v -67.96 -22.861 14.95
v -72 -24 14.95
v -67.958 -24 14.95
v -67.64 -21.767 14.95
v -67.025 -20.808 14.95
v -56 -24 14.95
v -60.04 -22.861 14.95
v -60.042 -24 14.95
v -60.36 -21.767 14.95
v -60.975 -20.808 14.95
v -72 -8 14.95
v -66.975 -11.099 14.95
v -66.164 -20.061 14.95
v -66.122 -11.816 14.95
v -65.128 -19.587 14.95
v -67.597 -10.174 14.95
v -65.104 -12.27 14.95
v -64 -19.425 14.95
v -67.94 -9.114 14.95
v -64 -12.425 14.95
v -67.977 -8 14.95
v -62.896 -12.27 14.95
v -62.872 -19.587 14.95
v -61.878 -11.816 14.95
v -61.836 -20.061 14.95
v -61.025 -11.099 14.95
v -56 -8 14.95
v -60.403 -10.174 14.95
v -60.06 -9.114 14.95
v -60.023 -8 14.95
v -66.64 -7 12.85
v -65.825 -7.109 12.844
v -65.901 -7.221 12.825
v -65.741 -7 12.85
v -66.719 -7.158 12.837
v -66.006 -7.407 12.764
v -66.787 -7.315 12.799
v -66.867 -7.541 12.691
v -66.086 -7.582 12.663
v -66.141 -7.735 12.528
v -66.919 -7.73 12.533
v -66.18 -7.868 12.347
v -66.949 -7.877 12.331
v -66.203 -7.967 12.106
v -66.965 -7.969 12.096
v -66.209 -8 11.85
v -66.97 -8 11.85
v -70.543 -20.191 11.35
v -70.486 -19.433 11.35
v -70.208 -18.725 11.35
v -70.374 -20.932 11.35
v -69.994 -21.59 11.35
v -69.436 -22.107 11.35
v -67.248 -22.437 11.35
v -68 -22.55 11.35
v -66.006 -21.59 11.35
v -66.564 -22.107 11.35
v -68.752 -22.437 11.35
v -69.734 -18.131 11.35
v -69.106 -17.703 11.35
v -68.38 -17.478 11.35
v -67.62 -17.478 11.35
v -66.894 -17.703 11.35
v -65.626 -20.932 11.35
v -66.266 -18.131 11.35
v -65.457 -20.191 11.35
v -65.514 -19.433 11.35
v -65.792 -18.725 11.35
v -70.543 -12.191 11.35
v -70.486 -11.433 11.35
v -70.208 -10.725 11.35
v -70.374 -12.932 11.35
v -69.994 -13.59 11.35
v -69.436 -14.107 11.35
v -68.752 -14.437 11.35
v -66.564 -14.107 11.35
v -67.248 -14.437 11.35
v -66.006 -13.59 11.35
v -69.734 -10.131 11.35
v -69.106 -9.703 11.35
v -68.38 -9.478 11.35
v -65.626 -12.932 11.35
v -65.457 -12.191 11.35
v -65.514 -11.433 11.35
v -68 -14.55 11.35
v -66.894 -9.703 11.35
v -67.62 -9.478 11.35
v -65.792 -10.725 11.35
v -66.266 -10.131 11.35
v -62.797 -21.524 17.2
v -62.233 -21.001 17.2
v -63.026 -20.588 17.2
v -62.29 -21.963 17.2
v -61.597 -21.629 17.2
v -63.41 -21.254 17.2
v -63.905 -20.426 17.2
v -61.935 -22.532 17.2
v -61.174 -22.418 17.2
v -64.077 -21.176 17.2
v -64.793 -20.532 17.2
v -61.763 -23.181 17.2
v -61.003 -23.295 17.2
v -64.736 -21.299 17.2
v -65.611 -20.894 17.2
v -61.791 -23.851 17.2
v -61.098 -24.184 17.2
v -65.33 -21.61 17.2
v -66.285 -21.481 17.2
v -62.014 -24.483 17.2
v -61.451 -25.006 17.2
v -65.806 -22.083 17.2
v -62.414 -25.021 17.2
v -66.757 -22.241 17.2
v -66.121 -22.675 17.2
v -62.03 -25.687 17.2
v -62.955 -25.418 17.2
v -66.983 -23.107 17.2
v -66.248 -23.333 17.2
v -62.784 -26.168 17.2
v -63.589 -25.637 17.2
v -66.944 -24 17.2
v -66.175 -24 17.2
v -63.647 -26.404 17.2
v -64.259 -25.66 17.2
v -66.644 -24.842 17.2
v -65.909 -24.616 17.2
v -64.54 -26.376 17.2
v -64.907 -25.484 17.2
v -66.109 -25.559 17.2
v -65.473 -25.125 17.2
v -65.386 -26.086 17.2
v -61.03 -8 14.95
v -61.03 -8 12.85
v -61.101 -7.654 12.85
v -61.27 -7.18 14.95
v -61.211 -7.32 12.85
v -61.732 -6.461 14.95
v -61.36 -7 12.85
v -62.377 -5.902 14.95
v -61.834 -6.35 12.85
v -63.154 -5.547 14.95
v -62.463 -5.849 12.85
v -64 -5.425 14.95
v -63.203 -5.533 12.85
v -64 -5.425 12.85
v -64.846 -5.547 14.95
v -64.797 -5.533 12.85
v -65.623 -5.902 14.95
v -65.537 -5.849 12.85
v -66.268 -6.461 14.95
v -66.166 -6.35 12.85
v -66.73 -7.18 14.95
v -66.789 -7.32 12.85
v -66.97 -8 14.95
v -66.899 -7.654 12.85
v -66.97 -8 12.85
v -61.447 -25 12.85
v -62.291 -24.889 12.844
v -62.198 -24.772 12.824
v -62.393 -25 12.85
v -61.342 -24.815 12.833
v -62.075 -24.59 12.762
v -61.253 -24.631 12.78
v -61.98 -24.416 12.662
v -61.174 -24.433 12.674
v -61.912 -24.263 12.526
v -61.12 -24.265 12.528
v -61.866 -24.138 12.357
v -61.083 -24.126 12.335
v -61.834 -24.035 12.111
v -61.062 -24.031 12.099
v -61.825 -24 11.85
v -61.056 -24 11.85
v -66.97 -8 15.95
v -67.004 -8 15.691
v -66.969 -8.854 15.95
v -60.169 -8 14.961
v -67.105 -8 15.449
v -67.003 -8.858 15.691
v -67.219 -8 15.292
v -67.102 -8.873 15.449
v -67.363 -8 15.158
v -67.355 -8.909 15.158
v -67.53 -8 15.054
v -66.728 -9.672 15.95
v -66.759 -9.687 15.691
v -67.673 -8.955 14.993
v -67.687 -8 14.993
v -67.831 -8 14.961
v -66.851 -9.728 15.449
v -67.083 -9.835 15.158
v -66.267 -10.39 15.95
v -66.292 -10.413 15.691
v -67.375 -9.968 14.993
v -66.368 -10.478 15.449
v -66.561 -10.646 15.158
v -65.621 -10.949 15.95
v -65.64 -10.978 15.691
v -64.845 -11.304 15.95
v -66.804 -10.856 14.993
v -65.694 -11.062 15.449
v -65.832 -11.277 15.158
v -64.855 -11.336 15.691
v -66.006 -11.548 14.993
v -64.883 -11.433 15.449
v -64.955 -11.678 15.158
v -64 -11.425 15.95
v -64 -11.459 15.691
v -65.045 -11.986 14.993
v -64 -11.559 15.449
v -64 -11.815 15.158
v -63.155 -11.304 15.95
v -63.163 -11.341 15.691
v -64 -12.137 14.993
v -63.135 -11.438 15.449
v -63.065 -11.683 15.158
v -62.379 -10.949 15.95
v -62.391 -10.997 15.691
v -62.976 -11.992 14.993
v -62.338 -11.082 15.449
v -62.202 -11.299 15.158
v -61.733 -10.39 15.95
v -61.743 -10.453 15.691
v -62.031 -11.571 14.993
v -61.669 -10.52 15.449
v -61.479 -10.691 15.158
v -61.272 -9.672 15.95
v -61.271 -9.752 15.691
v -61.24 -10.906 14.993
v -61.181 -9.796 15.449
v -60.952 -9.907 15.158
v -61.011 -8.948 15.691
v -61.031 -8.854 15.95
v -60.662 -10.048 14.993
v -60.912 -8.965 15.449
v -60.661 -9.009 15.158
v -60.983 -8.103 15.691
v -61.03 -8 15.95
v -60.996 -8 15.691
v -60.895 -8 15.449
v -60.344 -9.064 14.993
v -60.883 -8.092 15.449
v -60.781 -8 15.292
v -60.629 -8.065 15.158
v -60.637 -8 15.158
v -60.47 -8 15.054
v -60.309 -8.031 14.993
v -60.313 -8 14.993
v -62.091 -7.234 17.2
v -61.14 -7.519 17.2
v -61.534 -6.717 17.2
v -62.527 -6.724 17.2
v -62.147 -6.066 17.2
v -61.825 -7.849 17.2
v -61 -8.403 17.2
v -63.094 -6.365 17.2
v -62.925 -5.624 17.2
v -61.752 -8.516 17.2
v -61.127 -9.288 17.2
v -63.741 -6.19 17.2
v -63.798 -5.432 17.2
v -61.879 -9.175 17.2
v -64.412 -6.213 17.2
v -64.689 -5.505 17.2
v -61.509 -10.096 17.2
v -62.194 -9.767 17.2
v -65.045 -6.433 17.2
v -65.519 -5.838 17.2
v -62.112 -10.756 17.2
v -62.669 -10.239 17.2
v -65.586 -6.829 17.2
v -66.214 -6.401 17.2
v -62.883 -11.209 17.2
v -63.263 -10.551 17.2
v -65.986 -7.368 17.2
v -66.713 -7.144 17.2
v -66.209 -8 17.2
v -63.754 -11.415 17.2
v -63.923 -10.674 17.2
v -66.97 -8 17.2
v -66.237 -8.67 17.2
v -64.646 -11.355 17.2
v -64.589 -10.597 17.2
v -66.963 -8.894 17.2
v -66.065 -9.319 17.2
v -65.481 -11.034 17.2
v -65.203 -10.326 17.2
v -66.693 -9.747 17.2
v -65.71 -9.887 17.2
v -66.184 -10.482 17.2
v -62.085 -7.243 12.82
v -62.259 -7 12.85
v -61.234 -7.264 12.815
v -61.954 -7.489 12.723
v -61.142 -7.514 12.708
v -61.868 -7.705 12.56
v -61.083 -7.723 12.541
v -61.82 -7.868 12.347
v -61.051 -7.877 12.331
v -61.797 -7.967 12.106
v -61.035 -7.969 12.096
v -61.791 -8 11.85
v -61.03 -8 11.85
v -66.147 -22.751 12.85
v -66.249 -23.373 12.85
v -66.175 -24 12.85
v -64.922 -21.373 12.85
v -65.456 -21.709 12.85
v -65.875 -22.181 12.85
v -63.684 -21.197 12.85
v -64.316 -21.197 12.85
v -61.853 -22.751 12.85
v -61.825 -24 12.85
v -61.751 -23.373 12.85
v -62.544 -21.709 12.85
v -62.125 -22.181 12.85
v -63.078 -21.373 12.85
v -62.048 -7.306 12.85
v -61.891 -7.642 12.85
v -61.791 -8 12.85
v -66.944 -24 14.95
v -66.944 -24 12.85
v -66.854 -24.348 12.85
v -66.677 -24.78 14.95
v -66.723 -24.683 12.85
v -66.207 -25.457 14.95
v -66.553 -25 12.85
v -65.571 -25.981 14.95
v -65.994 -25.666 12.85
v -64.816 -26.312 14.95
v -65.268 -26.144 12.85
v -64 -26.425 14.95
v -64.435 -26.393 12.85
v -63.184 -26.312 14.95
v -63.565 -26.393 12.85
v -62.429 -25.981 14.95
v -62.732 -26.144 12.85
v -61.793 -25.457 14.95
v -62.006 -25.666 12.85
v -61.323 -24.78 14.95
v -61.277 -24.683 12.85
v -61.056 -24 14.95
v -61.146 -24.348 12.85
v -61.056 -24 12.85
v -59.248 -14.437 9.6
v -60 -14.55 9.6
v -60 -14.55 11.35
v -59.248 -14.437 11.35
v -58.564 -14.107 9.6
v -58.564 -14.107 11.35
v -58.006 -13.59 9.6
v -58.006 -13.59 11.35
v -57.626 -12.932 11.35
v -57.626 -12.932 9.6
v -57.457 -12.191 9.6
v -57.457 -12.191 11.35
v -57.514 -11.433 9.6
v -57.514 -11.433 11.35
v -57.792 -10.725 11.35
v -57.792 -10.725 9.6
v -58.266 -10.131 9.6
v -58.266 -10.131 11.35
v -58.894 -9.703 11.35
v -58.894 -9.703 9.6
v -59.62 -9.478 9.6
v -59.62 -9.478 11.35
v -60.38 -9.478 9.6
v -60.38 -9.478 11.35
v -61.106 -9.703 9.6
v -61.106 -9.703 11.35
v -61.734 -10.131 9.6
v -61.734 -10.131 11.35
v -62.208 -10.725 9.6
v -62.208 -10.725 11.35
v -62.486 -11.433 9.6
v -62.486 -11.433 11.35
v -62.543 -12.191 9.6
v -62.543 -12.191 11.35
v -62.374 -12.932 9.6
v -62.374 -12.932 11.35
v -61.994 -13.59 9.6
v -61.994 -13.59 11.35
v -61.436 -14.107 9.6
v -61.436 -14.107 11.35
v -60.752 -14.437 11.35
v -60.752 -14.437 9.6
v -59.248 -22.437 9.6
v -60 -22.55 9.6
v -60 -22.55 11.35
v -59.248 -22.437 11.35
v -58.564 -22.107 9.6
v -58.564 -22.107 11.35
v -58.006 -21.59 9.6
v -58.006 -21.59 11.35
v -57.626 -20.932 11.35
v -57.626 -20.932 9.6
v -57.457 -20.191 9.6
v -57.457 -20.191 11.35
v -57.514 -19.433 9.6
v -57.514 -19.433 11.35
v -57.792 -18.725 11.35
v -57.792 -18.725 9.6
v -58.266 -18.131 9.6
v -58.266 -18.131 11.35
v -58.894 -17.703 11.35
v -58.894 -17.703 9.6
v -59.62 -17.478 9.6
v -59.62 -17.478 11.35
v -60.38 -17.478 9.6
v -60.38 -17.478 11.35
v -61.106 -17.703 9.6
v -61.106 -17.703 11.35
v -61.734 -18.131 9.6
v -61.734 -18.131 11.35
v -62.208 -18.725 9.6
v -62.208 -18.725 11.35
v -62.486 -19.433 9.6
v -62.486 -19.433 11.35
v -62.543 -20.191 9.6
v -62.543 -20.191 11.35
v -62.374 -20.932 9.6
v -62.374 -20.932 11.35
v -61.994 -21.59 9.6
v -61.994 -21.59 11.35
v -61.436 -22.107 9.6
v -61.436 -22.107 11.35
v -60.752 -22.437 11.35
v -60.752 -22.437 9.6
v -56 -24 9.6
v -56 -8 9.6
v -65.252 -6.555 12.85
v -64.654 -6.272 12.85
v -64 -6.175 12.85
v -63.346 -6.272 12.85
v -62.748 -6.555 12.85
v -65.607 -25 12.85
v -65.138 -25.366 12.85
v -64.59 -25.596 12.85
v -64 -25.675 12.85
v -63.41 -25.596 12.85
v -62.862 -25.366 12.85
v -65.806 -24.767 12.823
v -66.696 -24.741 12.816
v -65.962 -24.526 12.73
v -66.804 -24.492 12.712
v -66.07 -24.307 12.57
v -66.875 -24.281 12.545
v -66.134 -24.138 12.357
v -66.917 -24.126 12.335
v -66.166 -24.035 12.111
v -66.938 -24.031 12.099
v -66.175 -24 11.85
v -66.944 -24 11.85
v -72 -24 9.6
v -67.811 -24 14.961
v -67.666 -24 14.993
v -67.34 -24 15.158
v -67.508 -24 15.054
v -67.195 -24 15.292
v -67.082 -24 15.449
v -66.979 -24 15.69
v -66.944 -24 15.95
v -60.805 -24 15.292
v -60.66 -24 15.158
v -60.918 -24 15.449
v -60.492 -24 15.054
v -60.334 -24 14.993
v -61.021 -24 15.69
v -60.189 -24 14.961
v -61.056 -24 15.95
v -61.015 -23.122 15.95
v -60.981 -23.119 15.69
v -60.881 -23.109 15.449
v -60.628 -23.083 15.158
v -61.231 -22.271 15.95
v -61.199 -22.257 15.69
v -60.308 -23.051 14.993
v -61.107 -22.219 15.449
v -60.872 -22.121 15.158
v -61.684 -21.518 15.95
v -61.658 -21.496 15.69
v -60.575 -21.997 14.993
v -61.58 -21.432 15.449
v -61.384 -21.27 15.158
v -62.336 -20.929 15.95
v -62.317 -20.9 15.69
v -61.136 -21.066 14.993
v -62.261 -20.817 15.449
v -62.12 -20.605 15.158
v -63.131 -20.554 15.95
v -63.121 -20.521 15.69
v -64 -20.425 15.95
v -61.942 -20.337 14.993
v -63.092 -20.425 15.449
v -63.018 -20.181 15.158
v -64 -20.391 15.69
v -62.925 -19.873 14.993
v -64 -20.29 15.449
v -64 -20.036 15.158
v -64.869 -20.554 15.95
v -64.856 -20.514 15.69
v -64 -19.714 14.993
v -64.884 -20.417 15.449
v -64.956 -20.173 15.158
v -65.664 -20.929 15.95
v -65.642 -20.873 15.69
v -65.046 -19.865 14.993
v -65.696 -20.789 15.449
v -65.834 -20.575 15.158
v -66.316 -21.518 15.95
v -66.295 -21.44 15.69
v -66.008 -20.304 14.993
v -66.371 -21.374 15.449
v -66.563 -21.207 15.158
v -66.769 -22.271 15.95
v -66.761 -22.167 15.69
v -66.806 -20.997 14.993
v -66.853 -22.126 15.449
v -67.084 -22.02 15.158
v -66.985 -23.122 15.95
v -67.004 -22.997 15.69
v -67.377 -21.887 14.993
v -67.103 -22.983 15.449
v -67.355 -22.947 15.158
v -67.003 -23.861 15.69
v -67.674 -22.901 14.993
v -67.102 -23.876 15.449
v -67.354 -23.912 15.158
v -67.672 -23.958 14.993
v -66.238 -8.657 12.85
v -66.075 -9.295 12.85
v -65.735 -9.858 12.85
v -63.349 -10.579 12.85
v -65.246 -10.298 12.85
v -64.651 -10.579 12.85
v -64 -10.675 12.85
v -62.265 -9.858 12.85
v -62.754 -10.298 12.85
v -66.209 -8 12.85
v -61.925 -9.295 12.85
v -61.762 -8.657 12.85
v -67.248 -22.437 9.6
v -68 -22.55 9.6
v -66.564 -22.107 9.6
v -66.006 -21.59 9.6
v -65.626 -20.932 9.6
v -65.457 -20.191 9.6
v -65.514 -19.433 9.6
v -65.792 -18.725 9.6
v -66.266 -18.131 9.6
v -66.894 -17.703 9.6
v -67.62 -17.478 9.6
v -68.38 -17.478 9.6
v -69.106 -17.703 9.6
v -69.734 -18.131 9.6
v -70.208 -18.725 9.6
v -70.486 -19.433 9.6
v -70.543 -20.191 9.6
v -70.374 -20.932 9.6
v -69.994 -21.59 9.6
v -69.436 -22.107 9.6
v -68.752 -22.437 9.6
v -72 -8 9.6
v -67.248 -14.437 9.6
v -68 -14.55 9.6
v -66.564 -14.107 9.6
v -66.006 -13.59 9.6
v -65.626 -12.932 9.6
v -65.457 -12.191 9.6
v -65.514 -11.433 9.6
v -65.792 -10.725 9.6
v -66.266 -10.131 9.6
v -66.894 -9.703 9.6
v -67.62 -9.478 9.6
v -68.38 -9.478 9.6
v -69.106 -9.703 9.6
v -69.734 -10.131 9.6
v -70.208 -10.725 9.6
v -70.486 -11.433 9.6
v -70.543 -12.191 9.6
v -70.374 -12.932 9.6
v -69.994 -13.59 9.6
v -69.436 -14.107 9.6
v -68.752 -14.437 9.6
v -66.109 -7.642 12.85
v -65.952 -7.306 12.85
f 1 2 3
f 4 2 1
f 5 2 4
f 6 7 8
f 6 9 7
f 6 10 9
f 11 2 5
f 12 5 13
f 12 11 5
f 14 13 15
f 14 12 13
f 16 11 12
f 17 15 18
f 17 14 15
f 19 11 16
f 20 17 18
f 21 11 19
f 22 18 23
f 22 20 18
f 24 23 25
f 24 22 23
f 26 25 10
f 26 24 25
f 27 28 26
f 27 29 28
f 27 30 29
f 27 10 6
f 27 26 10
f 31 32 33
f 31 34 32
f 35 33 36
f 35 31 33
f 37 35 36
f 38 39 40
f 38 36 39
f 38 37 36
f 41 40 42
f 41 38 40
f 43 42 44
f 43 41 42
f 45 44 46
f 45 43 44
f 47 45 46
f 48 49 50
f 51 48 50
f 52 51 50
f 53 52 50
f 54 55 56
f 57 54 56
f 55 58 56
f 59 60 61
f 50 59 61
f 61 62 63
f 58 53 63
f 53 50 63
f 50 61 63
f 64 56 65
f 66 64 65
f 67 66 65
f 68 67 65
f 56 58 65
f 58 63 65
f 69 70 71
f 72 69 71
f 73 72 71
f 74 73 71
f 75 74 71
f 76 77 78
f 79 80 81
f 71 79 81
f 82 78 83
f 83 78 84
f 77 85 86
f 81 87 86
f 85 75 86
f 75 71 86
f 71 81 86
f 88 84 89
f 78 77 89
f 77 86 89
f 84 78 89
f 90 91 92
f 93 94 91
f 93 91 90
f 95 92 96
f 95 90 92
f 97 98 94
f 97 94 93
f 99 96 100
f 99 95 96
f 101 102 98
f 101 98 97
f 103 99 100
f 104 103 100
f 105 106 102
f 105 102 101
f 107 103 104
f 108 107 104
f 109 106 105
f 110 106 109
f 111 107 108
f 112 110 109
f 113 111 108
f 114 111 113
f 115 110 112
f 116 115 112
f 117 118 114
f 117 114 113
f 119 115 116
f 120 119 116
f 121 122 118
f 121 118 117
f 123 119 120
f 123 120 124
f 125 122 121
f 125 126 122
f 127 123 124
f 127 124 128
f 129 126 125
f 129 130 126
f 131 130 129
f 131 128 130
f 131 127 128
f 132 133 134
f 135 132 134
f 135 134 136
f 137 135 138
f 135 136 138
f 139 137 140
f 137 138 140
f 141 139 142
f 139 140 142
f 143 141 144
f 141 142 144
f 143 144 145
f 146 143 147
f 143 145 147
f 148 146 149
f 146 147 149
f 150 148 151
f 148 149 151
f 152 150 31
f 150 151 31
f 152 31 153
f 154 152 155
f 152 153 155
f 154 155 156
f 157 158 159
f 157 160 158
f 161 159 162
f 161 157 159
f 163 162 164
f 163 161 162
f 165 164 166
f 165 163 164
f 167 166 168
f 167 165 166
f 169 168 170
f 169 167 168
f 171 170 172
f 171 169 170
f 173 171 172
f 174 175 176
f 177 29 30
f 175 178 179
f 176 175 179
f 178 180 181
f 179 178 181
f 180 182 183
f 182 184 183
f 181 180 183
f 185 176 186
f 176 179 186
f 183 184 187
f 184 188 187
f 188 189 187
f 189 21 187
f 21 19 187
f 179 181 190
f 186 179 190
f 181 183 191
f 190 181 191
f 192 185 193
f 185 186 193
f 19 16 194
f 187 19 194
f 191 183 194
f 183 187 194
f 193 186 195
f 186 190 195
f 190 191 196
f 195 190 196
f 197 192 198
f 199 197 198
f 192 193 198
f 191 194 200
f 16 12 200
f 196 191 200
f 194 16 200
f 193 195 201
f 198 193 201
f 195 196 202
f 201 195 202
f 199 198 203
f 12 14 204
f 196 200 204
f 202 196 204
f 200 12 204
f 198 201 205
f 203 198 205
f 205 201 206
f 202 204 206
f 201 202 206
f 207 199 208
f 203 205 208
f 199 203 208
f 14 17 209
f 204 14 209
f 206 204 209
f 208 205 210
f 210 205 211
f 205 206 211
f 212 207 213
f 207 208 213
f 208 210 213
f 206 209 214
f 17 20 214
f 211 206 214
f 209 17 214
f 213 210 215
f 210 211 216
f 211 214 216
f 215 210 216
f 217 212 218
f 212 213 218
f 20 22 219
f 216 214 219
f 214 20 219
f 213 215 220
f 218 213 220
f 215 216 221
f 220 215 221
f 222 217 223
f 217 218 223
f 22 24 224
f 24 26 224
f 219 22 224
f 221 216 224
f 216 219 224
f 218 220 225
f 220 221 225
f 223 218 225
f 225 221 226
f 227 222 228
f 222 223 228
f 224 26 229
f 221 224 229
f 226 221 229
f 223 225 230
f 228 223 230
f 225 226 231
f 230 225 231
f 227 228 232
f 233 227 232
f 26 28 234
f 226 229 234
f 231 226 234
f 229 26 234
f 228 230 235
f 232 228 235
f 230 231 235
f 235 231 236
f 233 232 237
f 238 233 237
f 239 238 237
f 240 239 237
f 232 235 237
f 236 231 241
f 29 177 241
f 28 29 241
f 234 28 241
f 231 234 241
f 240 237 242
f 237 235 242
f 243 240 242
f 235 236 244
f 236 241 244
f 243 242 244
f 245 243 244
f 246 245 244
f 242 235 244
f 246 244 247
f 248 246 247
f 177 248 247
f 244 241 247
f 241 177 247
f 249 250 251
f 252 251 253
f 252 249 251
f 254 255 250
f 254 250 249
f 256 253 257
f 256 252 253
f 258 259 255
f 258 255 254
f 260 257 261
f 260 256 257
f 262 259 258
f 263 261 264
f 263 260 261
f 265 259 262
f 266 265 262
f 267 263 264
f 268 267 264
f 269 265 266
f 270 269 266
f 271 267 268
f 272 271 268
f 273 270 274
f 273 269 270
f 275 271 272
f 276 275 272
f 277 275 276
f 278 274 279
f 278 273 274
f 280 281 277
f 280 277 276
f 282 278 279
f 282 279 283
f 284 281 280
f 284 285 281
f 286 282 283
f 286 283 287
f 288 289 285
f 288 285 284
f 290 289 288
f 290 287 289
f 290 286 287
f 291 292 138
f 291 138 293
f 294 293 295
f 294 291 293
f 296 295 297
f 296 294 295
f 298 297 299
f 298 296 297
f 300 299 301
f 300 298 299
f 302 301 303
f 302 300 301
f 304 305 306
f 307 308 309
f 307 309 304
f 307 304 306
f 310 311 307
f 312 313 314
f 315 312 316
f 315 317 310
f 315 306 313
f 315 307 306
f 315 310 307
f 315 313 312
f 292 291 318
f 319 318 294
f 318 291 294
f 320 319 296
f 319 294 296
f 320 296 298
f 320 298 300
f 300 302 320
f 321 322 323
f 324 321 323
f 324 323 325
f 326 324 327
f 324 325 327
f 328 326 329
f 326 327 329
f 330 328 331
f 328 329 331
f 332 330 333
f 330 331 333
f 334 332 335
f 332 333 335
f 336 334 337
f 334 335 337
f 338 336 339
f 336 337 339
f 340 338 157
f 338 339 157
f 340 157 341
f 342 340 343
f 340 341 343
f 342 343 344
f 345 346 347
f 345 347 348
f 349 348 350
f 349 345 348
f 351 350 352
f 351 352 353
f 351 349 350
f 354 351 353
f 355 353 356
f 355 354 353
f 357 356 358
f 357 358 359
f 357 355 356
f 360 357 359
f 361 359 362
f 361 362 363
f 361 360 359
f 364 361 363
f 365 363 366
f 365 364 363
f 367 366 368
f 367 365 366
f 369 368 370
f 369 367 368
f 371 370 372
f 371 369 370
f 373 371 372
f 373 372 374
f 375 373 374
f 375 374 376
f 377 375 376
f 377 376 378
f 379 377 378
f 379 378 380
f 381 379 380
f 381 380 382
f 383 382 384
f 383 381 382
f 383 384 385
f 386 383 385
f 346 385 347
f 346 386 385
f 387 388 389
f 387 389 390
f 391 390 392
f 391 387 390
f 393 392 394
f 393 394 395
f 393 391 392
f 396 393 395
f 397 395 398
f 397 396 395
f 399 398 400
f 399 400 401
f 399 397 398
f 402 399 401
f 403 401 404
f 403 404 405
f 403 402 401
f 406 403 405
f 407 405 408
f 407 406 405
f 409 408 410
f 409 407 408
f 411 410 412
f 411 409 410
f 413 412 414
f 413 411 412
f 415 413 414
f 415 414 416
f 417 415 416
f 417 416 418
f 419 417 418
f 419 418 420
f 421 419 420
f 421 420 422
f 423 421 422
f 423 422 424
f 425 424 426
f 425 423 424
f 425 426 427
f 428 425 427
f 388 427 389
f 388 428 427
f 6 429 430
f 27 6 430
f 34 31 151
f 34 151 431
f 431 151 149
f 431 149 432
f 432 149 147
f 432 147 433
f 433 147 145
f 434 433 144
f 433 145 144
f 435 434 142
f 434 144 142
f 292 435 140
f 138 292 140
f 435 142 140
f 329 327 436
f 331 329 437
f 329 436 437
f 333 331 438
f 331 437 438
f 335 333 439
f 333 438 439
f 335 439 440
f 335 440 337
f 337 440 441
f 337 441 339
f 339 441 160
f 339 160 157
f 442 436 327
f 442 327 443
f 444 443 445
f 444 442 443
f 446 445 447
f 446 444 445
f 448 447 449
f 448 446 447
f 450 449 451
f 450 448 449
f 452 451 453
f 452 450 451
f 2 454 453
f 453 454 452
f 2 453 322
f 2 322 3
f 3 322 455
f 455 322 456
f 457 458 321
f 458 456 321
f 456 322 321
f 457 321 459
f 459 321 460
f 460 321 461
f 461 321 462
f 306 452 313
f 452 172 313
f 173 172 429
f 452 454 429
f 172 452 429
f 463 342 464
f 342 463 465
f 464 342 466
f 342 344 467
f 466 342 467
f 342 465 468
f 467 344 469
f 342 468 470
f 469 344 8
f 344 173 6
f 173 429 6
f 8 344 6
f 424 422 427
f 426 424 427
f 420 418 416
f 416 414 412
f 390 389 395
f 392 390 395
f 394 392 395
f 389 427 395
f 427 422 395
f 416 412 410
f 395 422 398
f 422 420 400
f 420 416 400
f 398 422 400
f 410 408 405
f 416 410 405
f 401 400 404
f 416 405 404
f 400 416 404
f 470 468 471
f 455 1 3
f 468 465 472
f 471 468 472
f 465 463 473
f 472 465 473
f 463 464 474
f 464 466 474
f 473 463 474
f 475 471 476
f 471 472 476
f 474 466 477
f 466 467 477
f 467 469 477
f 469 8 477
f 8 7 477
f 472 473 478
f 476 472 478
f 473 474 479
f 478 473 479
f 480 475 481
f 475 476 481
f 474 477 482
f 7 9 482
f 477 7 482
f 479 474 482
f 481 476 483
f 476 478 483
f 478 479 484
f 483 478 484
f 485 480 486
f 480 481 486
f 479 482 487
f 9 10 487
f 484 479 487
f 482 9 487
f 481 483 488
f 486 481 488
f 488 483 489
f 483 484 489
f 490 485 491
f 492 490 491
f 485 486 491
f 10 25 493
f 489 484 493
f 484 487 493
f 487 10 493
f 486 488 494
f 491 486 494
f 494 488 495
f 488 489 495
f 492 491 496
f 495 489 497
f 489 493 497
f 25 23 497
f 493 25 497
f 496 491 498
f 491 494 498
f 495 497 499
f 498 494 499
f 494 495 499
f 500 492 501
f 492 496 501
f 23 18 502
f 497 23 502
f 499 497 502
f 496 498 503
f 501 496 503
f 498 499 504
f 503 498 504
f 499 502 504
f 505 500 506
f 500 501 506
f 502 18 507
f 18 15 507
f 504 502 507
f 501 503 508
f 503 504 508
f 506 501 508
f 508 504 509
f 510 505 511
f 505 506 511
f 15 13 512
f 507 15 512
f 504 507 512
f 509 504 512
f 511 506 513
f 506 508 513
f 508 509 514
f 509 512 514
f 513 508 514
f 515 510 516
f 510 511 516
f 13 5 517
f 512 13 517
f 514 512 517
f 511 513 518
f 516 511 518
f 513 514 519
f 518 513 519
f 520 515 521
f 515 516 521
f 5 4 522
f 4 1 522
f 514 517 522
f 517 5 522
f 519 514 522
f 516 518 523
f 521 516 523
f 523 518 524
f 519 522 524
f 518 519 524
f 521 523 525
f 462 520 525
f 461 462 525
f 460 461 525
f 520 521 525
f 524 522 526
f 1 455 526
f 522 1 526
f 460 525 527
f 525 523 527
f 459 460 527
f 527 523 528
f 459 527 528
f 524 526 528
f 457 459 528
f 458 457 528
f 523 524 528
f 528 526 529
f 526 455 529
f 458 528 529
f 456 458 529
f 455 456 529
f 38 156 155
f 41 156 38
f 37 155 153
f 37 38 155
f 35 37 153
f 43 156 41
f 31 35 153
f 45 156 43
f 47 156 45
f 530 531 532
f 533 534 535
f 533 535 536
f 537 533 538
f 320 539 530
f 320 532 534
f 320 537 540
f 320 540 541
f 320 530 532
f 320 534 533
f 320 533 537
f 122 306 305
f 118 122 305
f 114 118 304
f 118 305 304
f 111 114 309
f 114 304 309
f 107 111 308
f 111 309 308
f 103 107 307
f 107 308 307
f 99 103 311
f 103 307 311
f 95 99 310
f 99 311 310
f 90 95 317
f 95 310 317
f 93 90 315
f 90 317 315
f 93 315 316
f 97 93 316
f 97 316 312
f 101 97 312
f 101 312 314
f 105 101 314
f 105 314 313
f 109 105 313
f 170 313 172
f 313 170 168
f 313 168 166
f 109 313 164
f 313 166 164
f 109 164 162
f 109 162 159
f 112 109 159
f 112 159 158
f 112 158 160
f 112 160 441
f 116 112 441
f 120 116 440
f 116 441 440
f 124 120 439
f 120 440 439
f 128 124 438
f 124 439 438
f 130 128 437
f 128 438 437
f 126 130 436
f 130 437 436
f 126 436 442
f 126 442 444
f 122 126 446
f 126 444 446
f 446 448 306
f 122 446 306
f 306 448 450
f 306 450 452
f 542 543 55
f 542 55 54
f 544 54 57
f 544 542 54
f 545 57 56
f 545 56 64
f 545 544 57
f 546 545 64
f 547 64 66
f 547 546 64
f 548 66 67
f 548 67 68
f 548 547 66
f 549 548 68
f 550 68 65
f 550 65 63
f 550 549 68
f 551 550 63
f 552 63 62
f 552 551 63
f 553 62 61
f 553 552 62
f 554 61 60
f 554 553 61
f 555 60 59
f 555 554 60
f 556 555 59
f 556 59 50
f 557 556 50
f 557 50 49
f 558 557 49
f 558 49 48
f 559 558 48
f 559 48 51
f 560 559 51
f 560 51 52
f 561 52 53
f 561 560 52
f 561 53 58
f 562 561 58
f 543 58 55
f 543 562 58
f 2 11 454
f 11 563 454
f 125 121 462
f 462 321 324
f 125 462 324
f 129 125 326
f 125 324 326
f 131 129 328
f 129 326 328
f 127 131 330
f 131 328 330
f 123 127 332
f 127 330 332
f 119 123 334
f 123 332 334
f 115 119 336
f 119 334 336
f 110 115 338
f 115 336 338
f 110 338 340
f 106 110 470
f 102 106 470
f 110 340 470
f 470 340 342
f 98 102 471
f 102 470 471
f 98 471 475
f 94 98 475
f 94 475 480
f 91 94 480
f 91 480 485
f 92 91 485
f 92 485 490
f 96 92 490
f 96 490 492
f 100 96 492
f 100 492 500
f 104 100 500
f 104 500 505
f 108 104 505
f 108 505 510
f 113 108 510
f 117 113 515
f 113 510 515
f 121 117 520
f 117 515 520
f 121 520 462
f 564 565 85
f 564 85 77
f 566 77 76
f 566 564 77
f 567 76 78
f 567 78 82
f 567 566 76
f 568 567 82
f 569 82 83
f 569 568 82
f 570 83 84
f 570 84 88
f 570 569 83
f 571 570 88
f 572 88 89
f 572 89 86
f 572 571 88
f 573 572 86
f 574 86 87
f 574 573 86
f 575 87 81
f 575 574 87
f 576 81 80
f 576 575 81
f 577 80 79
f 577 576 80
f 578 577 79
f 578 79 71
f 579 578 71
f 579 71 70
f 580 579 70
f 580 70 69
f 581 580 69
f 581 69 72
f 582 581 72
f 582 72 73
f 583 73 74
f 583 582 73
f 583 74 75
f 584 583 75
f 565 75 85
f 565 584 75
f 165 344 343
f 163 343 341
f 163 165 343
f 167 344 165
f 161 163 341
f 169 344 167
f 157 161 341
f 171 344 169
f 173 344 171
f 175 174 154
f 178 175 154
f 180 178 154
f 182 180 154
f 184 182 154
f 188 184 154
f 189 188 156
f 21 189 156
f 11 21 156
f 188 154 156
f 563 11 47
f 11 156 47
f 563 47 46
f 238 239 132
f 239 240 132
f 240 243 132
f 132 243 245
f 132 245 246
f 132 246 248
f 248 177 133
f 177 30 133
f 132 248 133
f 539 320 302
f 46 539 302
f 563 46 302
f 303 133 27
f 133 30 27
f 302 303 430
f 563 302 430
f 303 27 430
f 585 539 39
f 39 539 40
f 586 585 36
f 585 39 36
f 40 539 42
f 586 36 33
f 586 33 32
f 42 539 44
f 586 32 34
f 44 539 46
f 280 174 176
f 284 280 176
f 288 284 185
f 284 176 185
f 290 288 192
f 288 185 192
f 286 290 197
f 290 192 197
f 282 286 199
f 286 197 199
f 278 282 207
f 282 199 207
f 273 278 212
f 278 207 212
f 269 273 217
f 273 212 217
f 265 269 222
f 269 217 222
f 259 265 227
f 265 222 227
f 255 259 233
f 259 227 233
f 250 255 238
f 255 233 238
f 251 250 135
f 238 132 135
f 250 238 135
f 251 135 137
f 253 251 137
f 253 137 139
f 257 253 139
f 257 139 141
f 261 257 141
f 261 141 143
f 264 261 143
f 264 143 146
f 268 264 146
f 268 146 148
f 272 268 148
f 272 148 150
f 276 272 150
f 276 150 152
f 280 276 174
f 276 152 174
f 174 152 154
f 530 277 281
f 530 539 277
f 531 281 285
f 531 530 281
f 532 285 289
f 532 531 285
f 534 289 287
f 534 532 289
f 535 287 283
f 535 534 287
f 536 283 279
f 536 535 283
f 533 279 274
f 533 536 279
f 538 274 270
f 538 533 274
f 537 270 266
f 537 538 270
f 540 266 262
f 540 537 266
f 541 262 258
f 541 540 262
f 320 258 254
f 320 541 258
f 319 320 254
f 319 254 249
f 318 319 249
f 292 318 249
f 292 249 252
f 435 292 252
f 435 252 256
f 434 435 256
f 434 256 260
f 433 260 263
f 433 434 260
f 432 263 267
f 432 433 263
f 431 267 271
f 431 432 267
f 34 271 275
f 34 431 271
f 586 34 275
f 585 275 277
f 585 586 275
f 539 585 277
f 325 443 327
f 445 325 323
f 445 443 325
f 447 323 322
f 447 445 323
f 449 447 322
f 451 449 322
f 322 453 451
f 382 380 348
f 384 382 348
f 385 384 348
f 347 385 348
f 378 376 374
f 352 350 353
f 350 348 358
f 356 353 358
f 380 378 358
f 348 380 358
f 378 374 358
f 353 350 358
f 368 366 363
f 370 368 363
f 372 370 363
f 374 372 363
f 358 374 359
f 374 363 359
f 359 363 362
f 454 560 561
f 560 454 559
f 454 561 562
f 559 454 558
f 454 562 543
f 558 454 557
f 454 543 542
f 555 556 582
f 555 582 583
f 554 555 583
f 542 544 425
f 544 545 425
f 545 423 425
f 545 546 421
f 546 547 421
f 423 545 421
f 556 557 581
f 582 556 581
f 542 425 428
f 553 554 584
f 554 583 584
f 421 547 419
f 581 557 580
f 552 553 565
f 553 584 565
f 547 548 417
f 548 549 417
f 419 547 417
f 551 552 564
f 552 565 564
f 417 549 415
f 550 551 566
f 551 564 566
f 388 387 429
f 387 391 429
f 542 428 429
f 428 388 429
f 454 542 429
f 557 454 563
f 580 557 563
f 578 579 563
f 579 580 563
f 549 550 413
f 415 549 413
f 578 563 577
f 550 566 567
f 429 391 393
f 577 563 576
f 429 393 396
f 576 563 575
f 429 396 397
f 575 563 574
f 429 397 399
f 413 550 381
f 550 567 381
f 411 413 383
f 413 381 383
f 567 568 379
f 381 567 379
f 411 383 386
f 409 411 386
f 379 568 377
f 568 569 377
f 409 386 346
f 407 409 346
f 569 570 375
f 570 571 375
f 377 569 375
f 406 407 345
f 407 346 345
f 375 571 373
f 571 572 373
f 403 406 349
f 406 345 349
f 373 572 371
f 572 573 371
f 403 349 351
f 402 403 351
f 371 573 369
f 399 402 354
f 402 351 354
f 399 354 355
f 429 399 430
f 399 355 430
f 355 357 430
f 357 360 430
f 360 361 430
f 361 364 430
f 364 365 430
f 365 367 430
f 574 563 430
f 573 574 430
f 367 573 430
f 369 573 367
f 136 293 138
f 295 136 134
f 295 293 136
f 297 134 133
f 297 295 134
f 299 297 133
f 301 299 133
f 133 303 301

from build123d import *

# Parameters (mm, degrees)
SKETCH5_W           = 16
SKETCH5_H           = 16
SKETCH5_R           = 2.55
BOSS_EXTRUDE1_DEPTH = 1.75
BOSS_EXTRUDE2_START = 1.75
SKETCH5_4_W         = 16
SKETCH5_4_H         = 16
BOSS_EXTRUDE2_DEPTH = 1.5
BOSS_EXTRUDE3_START = 3.25
SKETCH5_5_R         = 2.25
BOSS_EXTRUDE3_DEPTH = 2.1
BOSS_EXTRUDE4_START = 5.35
SKETCH5_6_R         = 3
SKETCH5_6_R_2       = 2.25
BOSS_EXTRUDE4_DEPTH = 2.25
FILLET1_R           = 1


with BuildPart() as part:
    # Sketch5 → Boss-Extrude1 (new body)
    with BuildSketch(Plane.XY.offset(9.6)):
        with Locations((-64, -16)):
            Rectangle(SKETCH5_W, SKETCH5_H)
        with Locations(Location((-68, -20, 0), (0, 0, 270))):
            Circle(SKETCH5_R, mode=Mode.SUBTRACT)
        with Locations(Location((-60, -20, 0), (0, 0, 270))):
            Circle(SKETCH5_R, mode=Mode.SUBTRACT)
        with Locations(Location((-68, -12, 0), (0, 0, 270))):
            Circle(SKETCH5_R, mode=Mode.SUBTRACT)
        with Locations(Location((-60, -12, 0), (0, 0, 270))):
            Circle(SKETCH5_R, mode=Mode.SUBTRACT)
    extrude(amount=BOSS_EXTRUDE1_DEPTH)

    # Sketch5<4> → Boss-Extrude2 (add)
    with BuildSketch(Plane.XY.offset(9.6).offset(BOSS_EXTRUDE2_START)):
        with Locations((-64, -16)):
            Rectangle(SKETCH5_4_W, SKETCH5_4_H)
    extrude(amount=BOSS_EXTRUDE2_DEPTH)

    # Sketch5<5> → Boss-Extrude3 (add)
    with BuildSketch(Plane.XY.offset(9.6).offset(BOSS_EXTRUDE3_START)):
        with BuildLine():
            Line((-66.969743255, -8), (-72, -8))
            Line((-72, -8), (-72, -24))
            Line((-72, -24), (-66.94438024, -24))
            ThreePointArc((-66.94438024, -24), (-64, -26.425), (-61.05561976, -24))
            Line((-61.05561976, -24), (-56, -24))
            Line((-56, -24), (-56, -8))
            Line((-56, -8), (-61.030256745, -8))
            ThreePointArc((-61.030256745, -8), (-64, -5.425), (-66.969743255, -8))
        make_face()
        with Locations(Location((-64, -23.425, 0), (0, 0, 194.806506912))):
            Circle(SKETCH5_5_R, mode=Mode.SUBTRACT)
        with Locations(Location((-64, -8.425, 0), (0, 0, 169.11205187))):
            Circle(SKETCH5_5_R, mode=Mode.SUBTRACT)
    extrude(amount=BOSS_EXTRUDE3_DEPTH)

    # Sketch5<6> → Boss-Extrude4 (add)
    # profile 1 of 2: a face of its own
    with BuildSketch(Plane.XY.offset(9.6).offset(BOSS_EXTRUDE4_START)):
        with Locations(Location((-64, -8.425, 0), (0, 0, 171.855699446))):
            Circle(SKETCH5_6_R)
        with Locations(Location((-64, -8.425, 0), (0, 0, 169.11205187))):
            Circle(SKETCH5_6_R_2, mode=Mode.SUBTRACT)
    # profile 2 of 2: a face of its own
    with BuildSketch(Plane.XY.offset(9.6).offset(BOSS_EXTRUDE4_START)):
        with Locations(Location((-64, -23.425, 0), (0, 0, 191.050064959))):
            Circle(SKETCH5_6_R)
        with Locations(Location((-64, -23.425, 0), (0, 0, 194.806506912))):
            Circle(SKETCH5_6_R_2, mode=Mode.SUBTRACT)
    extrude(amount=BOSS_EXTRUDE4_DEPTH)

    # Fillet1
    # the kernel refuses this fillet: 1 mm, written as the material it adds along each edge
    with BuildSketch(Plane(origin=(-64, -8.425, 14.95), x_dir=(-0.5594516759376825, 0.8288629695495621, 0), z_dir=(0.8288629695495621, 0.5594516759376825, 0))) as fillet1_piece_1_section:
        with BuildLine():
            CenterArc((3 + FILLET1_R, FILLET1_R), FILLET1_R, 180, 90)
            Line((3, FILLET1_R), (3, 0))
            Line((3, 0), (3 + FILLET1_R, 0))
        make_face()
    fillet1_piece_1 = revolve(axis=Axis((-64, -8.425, 14.95), (0, 0, 1)), revolution_arc=291.964228084, mode=Mode.PRIVATE)
    fillet1_piece_1 = split(fillet1_piece_1, bisect_by=Plane(origin=(-64, -8, 15.233484072), z_dir=(0, -1, 0)), keep=Keep.TOP, mode=Mode.PRIVATE)
    add(fillet1_piece_1)
    with BuildSketch(Plane(origin=(-64, -23.425, 14.95), x_dir=(0.516632343586421, -0.8562073472941015, 0), z_dir=(-0.8562073472941015, -0.516632343586421, 0))) as fillet1_piece_2_section:
        with BuildLine():
            CenterArc((3 + FILLET1_R, FILLET1_R), FILLET1_R, 180, 90)
            Line((3 + FILLET1_R, 0), (3, 0))
            Line((3, 0), (3, FILLET1_R))
        make_face()
    fillet1_piece_2 = revolve(axis=Axis((-64, -23.425, 14.95), (0, 0, 1)), revolution_arc=297.786748706, mode=Mode.PRIVATE)
    fillet1_piece_2 = split(fillet1_piece_2, bisect_by=Plane(origin=(-64, -24, 15.23339809), z_dir=(0, 1, 0)), keep=Keep.TOP, mode=Mode.PRIVATE)
    add(fillet1_piece_2)
    with BuildSketch(Plane(origin=(-58.55561976, -24, 12.85), x_dir=(0, 0, -1), z_dir=(-1, 0, 0))) as fillet1_piece_3_section:
        with BuildLine():
            CenterArc((FILLET1_R, FILLET1_R), FILLET1_R, 180, 90)
            Line((0, FILLET1_R), (0, 0))
            Line((0, 0), (FILLET1_R, 0))
        make_face()
    fillet1_piece_3 = extrude(amount=5.769092903, mode=Mode.PRIVATE)
    fillet1_piece_3 = fillet1_piece_3 - Plane(origin=(-64, -23.425, 12.629693614), x_dir=(-0.9667943721514972, -0.2555555555572849, 0), z_dir=(0, 0, -1)) * Cylinder(2.25, 16, mode=Mode.PRIVATE)
    fillet1_piece_3 = fillet1_piece_3 & Plane(origin=(-64, -23.425, 12.629693614), x_dir=(-0.9814600801300545, -0.19166666666665624, 0), z_dir=(0, 0, -1)) * Cylinder(3, 16, mode=Mode.PRIVATE)
    add(fillet1_piece_3)
    with BuildSketch(Plane(origin=(-63.675287337, -24, 12.85), x_dir=(0, 0, -1), z_dir=(-1, 0, 0))) as fillet1_piece_4_section:
        with BuildLine():
            CenterArc((FILLET1_R, FILLET1_R), FILLET1_R, 180, 90)
            Line((0, FILLET1_R), (0, 0))
            Line((0, 0), (FILLET1_R, 0))
        make_face()
    fillet1_piece_4 = extrude(amount=5.769092903, mode=Mode.PRIVATE)
    fillet1_piece_4 = fillet1_piece_4 - Plane(origin=(-64, -23.425, 12.629693822), x_dir=(-0.9667943721514972, -0.2555555555572849, 0), z_dir=(0, 0, -1)) * Cylinder(2.25, 16, mode=Mode.PRIVATE)
    fillet1_piece_4 = fillet1_piece_4 & Plane(origin=(-64, -23.425, 12.629693822), x_dir=(-0.9814600801300545, -0.19166666666665624, 0), z_dir=(0, 0, -1)) * Cylinder(3, 16, mode=Mode.PRIVATE)
    add(fillet1_piece_4)
    with BuildSketch(Plane(origin=(-64.290503451, -8, 12.85), x_dir=(0, 1, 0), z_dir=(1, 0, 0))) as fillet1_piece_5_section:
        with BuildLine():
            CenterArc((FILLET1_R, -FILLET1_R), FILLET1_R, 90, 90)
            Line((0, -FILLET1_R), (0, 0))
            Line((0, 0), (FILLET1_R, 0))
        make_face()
    fillet1_piece_5 = extrude(amount=5.760246706, mode=Mode.PRIVATE)
    fillet1_piece_5 = fillet1_piece_5 & Plane(origin=(-64, -8.425, 12.629046525), x_dir=(0.9899144182986506, 0.14166666666666652, 0), z_dir=(0, 0, -1)) * Cylinder(3, 16, mode=Mode.PRIVATE)
    fillet1_piece_5 = fillet1_piece_5 - Plane(origin=(-64, -8.425, 12.629046525), x_dir=(-0.9819984662183027, 0.1888888888868298, 0), z_dir=(0, 0, -1)) * Cylinder(2.25, 16, mode=Mode.PRIVATE)
    add(fillet1_piece_5)
    with BuildSketch(Plane(origin=(-69.469743255, -8, 12.85), x_dir=(0, 1, 0), z_dir=(1, 0, 0))) as fillet1_piece_6_section:
        with BuildLine():
            CenterArc((FILLET1_R, -FILLET1_R), FILLET1_R, 90, 90)
            Line((0, -FILLET1_R), (0, 0))
            Line((0, 0), (FILLET1_R, 0))
        make_face()
    fillet1_piece_6 = extrude(amount=5.760246706, mode=Mode.PRIVATE)
    fillet1_piece_6 = fillet1_piece_6 & Plane(origin=(-64, -8.425, 12.629046589), x_dir=(0.9899144182986506, 0.14166666666666652, 0), z_dir=(0, 0, -1)) * Cylinder(3, 16, mode=Mode.PRIVATE)
    fillet1_piece_6 = fillet1_piece_6 - Plane(origin=(-64, -8.425, 12.629046589), x_dir=(-0.9819984662183027, 0.1888888888868298, 0), z_dir=(0, 0, -1)) * Cylinder(2.25, 16, mode=Mode.PRIVATE)
    add(fillet1_piece_6)


solid = part.part
